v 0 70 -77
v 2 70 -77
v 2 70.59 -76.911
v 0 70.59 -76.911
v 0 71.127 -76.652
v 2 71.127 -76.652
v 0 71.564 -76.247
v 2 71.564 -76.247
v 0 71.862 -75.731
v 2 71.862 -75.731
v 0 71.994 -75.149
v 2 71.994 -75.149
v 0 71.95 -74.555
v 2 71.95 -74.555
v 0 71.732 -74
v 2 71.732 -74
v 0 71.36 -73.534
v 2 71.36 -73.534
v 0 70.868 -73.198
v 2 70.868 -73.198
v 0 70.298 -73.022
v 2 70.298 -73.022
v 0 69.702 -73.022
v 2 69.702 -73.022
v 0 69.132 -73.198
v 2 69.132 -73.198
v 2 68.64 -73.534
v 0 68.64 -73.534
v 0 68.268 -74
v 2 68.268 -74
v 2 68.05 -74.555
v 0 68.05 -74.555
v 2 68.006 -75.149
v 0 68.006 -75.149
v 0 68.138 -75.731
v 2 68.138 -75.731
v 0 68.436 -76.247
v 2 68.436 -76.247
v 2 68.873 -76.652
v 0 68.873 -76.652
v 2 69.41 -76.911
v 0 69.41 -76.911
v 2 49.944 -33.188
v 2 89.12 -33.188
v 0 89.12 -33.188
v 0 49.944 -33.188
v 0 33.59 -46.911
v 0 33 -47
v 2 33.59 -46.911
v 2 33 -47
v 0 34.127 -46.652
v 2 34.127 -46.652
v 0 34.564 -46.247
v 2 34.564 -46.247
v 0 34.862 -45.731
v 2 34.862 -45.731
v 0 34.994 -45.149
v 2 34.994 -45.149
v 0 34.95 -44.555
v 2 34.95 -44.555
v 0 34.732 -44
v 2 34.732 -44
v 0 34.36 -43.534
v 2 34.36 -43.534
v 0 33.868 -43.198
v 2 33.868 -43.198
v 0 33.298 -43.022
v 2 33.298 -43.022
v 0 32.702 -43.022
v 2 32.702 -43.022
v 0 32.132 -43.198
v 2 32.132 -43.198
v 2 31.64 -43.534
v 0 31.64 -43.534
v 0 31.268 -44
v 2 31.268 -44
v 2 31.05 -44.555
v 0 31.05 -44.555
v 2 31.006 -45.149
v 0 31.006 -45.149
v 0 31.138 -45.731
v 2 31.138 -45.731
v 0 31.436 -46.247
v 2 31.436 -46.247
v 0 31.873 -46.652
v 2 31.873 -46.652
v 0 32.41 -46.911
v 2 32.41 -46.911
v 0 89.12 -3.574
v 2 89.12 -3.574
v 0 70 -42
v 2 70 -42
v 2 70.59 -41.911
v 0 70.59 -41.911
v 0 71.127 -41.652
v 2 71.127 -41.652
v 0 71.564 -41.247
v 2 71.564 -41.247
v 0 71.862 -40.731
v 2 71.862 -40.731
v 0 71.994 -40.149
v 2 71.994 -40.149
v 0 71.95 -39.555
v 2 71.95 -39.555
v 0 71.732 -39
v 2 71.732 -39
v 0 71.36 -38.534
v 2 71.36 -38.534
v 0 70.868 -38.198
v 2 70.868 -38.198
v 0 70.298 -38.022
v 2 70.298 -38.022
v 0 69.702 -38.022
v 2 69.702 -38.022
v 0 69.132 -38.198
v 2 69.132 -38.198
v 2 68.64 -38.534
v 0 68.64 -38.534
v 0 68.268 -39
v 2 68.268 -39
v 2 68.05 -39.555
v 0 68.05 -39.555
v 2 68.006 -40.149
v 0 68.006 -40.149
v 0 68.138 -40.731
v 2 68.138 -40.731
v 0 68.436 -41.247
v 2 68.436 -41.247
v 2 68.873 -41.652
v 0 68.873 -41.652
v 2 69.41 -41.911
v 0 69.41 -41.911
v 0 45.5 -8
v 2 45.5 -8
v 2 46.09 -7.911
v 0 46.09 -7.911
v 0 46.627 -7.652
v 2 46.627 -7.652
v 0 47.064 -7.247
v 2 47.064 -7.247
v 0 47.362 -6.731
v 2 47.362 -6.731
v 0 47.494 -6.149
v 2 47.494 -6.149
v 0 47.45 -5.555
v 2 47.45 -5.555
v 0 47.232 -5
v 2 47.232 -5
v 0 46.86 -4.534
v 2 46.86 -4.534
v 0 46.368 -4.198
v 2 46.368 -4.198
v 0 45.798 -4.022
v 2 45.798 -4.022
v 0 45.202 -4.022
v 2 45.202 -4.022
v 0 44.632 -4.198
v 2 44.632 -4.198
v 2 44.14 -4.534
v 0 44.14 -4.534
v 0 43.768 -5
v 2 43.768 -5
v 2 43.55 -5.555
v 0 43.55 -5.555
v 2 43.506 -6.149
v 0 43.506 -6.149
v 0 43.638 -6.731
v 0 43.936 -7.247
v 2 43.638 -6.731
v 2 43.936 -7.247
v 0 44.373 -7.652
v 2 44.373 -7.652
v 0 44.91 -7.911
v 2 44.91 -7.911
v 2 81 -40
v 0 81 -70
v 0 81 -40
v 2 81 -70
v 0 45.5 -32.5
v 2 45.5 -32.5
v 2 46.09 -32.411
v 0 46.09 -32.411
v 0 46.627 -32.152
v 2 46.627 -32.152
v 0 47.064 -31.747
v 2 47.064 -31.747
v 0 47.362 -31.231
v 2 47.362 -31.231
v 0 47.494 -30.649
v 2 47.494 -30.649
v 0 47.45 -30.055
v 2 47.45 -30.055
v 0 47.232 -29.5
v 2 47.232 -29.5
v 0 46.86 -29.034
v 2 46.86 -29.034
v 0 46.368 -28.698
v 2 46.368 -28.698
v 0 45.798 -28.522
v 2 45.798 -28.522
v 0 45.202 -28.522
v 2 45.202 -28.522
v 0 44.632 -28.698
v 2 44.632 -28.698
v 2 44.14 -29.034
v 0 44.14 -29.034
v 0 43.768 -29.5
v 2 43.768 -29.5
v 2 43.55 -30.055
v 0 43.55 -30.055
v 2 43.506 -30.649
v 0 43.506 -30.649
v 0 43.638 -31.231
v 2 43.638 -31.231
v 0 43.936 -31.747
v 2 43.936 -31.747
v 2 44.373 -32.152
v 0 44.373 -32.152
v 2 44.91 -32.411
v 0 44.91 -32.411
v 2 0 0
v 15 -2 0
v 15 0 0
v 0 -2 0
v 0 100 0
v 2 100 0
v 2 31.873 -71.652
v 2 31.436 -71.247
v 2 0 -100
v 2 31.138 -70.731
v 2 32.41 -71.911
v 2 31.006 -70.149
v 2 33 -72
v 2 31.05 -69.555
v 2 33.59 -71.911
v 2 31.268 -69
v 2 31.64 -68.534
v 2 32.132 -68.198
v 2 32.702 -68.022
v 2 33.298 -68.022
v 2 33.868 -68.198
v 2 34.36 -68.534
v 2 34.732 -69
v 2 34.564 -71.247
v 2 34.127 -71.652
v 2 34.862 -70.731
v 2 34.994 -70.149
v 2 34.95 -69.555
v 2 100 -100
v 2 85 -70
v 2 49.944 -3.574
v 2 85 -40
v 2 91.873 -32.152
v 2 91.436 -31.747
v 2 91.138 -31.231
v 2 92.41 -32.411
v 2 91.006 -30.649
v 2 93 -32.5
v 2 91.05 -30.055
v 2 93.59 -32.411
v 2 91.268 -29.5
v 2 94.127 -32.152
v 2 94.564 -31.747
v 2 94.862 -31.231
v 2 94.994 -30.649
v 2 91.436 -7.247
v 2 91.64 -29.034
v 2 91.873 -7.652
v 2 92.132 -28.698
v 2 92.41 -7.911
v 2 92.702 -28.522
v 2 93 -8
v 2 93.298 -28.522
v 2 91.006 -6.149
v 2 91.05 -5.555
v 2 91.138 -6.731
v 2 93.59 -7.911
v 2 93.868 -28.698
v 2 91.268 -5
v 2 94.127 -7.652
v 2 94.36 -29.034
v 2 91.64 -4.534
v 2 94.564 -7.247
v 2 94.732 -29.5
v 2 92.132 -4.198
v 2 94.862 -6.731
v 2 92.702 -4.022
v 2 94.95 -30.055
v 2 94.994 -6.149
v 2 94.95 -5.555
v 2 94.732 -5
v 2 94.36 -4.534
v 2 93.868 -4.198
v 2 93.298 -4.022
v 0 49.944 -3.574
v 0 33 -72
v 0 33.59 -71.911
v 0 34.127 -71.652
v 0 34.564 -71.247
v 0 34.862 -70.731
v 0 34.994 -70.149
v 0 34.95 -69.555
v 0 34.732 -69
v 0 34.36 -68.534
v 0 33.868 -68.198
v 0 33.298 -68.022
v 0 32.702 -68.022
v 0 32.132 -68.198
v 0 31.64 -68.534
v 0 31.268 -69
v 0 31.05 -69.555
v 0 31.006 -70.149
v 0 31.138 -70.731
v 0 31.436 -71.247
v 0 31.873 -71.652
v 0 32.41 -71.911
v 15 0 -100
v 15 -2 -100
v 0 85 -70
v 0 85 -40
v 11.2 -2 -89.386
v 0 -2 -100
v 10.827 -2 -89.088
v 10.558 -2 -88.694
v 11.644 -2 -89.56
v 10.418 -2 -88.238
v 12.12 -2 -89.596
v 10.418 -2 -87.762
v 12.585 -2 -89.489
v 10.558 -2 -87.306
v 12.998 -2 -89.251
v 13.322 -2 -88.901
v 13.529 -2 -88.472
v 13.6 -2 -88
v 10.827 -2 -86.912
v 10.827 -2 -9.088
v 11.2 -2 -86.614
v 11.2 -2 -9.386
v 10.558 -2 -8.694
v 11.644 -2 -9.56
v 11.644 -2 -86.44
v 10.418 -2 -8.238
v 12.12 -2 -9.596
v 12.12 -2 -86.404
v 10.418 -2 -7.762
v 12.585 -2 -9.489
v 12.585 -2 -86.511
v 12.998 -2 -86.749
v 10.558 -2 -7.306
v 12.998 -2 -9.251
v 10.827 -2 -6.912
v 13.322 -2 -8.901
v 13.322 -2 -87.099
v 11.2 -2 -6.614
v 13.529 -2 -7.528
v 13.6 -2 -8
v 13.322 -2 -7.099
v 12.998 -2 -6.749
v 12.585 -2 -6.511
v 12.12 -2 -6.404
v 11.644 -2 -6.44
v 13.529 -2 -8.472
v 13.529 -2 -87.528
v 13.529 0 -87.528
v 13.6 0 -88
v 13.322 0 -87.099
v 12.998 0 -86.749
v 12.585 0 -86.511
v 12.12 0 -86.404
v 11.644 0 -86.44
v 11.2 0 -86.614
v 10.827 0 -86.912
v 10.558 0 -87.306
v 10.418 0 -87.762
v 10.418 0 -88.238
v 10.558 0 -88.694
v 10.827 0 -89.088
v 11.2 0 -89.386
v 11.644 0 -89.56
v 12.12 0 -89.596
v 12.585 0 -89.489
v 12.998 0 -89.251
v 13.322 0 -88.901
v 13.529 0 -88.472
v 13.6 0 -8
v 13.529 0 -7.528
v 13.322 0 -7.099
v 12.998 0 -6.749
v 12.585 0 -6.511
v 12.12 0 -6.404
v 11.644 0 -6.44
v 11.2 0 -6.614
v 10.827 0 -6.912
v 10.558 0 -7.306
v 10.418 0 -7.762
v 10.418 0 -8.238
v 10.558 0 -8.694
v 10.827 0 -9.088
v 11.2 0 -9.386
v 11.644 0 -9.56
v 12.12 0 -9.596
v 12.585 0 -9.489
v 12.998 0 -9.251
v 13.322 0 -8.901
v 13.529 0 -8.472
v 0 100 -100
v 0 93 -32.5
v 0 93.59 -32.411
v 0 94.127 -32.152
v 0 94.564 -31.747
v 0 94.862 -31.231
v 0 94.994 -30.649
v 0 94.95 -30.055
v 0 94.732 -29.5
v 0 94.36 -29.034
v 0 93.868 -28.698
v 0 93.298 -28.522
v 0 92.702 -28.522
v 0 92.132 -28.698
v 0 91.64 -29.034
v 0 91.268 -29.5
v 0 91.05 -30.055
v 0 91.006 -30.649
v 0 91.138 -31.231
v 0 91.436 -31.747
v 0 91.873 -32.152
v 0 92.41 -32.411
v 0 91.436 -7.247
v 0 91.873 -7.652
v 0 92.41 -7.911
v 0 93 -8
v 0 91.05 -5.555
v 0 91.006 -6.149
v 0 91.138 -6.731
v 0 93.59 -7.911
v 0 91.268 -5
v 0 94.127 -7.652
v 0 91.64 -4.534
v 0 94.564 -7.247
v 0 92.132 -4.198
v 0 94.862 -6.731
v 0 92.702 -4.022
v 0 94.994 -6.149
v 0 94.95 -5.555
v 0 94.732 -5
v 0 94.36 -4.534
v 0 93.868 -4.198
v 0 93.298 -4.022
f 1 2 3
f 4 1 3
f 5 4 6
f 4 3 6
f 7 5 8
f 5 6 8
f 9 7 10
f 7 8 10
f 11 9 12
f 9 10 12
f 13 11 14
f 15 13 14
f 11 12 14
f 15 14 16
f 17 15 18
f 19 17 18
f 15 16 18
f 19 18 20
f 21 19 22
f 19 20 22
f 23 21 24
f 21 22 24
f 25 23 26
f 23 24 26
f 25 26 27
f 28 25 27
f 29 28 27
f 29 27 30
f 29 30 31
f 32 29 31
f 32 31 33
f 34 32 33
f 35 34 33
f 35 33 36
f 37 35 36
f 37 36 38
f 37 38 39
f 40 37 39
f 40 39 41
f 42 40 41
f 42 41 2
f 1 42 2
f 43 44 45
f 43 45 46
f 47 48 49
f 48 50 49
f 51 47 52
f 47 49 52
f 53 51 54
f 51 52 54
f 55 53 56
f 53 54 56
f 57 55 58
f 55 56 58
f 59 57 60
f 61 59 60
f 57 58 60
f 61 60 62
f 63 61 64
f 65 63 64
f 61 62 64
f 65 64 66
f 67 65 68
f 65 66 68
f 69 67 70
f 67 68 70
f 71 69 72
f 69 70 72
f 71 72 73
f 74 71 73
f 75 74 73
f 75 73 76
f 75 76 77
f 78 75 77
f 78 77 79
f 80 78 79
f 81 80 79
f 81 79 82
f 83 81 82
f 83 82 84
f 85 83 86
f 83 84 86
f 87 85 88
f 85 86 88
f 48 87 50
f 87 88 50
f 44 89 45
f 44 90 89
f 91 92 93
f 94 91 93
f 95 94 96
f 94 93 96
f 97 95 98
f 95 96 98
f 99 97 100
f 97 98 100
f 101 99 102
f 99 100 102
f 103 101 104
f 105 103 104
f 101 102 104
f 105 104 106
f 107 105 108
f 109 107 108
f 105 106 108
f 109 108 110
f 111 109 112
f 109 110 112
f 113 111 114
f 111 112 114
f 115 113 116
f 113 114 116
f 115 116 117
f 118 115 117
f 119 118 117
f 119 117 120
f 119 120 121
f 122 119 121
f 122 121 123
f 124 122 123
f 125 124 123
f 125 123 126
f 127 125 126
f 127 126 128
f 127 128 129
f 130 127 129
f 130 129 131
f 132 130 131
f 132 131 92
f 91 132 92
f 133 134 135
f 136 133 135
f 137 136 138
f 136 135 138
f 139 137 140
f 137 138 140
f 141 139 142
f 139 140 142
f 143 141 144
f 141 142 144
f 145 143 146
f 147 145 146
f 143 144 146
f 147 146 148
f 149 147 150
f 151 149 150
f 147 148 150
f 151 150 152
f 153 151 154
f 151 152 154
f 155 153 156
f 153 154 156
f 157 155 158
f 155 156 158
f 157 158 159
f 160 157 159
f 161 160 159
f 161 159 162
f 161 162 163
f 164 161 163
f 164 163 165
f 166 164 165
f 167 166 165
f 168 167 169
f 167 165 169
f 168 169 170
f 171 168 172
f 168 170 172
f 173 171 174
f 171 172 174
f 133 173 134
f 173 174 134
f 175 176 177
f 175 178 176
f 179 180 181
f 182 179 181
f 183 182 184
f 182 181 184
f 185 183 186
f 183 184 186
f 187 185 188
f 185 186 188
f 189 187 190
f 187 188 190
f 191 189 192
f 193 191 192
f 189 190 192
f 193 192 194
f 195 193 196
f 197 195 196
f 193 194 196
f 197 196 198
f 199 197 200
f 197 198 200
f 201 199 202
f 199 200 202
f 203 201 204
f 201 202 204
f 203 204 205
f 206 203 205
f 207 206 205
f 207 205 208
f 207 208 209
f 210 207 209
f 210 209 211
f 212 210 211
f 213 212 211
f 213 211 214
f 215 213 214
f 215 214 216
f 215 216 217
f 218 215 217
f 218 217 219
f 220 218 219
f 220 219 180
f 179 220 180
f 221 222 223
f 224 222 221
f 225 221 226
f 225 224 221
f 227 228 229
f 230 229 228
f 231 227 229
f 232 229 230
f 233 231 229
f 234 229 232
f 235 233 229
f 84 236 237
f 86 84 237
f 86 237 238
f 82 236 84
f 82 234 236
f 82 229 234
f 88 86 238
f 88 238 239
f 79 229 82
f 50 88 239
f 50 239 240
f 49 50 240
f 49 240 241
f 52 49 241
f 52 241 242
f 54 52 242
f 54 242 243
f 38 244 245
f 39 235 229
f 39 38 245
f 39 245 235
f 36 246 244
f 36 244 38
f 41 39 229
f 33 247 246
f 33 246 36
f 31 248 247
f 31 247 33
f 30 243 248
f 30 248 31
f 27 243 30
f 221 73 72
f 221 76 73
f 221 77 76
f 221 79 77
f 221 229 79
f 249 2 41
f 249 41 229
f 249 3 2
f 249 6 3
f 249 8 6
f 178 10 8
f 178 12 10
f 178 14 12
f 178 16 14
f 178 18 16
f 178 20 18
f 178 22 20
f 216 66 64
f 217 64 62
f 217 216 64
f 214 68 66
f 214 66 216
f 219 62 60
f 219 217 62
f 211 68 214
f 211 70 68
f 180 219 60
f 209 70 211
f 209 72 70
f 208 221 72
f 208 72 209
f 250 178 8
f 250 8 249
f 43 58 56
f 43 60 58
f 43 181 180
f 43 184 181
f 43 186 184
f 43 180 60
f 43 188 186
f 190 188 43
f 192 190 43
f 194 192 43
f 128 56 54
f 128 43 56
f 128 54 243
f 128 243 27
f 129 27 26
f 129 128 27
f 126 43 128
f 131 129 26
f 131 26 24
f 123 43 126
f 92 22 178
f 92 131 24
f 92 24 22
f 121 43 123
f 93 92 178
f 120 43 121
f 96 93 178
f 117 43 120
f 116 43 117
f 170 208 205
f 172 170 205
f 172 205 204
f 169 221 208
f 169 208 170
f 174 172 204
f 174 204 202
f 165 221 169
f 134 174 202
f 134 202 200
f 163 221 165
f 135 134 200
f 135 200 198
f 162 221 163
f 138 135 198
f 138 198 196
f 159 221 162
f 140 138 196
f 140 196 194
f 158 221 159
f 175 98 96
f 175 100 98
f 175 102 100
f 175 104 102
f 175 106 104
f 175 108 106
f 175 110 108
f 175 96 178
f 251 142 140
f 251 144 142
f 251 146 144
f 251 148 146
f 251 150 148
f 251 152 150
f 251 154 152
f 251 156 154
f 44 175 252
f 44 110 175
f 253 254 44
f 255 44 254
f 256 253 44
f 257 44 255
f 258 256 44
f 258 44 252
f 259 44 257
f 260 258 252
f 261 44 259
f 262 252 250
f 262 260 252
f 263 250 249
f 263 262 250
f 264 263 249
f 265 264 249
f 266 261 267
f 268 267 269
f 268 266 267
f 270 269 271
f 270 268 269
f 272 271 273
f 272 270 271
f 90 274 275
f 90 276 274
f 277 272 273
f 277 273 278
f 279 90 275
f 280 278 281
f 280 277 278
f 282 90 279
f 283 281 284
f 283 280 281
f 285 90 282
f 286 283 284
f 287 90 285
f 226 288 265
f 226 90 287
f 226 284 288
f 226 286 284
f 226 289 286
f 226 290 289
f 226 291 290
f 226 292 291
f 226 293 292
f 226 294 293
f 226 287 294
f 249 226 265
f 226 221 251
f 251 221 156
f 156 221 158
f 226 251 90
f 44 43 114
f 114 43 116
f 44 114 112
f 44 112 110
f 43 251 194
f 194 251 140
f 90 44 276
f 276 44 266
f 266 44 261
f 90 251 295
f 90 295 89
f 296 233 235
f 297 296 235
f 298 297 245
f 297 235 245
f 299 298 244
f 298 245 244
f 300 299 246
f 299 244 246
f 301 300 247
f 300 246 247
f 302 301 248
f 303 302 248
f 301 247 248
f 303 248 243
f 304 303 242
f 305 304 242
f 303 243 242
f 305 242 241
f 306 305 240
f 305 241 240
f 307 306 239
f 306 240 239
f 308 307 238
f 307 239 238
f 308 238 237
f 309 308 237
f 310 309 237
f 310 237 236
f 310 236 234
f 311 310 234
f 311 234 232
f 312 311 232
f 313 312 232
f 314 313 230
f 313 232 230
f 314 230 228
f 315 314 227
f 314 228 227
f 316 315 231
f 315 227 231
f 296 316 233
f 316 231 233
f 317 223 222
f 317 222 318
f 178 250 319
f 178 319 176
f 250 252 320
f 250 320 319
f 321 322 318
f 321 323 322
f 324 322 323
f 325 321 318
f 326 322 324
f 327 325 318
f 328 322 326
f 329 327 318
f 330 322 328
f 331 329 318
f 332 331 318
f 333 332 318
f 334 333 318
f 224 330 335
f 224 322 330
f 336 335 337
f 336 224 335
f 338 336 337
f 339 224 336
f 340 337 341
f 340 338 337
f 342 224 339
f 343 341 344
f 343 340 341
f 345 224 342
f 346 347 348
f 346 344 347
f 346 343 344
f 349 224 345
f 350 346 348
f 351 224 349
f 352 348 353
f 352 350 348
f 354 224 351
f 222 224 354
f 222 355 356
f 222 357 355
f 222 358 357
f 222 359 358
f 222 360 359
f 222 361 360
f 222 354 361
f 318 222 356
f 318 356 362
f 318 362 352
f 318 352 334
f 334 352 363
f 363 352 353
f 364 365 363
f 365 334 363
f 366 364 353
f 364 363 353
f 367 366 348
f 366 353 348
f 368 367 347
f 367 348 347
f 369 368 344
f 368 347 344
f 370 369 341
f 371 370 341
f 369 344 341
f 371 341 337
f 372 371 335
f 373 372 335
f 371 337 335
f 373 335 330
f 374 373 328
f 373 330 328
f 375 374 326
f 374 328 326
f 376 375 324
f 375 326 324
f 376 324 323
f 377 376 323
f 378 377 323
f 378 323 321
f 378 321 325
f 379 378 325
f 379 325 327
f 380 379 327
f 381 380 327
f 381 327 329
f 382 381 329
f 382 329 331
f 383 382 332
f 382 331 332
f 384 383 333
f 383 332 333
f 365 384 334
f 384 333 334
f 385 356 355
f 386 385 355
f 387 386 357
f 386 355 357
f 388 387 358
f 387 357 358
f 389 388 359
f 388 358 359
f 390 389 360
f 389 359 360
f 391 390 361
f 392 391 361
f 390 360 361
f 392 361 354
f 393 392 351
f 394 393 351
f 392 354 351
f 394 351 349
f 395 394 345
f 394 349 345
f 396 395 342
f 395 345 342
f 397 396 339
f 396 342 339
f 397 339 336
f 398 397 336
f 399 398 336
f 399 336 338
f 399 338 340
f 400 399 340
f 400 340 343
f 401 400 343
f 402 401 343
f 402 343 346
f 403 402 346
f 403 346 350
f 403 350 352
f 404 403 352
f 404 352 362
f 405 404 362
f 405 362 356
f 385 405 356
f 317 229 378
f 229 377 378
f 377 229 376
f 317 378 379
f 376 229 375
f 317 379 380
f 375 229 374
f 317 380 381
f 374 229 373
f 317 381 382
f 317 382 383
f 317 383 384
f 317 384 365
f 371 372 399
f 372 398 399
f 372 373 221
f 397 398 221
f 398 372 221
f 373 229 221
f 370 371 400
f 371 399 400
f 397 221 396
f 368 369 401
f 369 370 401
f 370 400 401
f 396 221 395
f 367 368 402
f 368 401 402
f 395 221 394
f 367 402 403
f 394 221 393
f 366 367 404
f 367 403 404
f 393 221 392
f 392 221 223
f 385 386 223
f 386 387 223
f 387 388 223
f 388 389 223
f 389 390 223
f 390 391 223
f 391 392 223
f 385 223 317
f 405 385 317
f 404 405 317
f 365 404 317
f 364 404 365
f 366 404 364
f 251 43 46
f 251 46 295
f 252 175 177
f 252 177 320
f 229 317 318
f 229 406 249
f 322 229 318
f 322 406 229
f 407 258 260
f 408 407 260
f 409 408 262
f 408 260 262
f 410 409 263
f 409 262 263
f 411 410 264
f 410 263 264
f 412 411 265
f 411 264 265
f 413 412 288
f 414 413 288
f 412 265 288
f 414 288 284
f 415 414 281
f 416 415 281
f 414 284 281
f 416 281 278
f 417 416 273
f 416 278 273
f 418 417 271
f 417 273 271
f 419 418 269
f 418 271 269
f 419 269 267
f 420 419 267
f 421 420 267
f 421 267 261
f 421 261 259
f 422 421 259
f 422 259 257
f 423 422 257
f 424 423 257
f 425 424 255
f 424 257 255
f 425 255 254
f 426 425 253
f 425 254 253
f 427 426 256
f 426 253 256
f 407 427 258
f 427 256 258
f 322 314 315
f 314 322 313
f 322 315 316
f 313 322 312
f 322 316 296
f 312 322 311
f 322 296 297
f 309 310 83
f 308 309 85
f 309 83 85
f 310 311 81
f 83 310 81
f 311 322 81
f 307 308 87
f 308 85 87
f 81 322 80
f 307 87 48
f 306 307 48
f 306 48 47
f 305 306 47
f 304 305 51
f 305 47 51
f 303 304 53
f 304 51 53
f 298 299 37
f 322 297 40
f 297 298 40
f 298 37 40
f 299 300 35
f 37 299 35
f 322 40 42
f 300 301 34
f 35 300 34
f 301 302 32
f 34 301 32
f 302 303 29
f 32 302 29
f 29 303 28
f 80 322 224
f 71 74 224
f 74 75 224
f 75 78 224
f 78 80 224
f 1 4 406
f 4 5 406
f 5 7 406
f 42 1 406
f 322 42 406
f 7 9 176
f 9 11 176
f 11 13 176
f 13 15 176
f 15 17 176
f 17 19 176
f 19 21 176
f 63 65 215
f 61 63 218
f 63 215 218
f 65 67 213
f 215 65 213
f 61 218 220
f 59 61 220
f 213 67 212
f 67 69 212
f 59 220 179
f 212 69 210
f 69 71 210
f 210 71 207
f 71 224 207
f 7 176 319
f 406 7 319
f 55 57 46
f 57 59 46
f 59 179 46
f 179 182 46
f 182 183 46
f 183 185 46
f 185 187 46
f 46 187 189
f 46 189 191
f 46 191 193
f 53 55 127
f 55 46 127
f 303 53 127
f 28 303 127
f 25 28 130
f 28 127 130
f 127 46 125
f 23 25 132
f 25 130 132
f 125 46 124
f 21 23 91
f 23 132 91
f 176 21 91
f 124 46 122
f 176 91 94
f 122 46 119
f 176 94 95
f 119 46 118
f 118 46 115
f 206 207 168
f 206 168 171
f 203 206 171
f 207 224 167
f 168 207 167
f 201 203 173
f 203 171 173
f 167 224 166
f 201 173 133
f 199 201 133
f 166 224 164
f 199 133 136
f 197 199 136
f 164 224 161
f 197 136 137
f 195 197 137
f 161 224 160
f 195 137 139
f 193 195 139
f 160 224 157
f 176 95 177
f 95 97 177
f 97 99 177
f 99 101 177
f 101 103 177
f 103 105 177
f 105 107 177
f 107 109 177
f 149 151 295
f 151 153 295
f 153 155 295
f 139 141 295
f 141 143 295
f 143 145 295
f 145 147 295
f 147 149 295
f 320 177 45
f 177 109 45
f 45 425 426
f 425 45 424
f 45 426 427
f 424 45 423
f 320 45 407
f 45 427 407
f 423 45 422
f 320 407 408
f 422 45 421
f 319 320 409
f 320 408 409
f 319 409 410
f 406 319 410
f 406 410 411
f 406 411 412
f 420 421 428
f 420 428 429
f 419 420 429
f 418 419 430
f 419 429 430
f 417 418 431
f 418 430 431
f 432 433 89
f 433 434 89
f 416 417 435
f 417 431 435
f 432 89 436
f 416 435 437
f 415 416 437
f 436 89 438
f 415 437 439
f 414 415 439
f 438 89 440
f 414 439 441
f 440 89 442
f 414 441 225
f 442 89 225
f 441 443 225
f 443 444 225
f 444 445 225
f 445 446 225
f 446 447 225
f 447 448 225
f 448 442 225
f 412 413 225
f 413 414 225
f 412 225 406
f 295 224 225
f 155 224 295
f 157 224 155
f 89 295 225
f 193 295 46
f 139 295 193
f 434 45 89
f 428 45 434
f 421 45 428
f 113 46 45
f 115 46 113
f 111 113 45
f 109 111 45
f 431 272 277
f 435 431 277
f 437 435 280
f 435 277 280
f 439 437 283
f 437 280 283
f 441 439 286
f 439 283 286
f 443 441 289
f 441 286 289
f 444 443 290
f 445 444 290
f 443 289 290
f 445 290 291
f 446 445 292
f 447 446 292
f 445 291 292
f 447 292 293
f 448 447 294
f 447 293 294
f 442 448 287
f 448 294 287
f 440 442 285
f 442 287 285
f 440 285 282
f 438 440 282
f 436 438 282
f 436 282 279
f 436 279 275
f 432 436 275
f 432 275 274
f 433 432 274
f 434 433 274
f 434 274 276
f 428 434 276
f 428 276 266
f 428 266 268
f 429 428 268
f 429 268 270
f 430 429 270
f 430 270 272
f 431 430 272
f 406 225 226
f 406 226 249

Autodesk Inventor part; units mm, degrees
ref_plane "YZ Plane" through (0, 0, 0) normal (1, 0, 0) x (0, 1, 0)
ref_plane "XZ Plane" through (0, 0, 0) normal (0, 1, 0) x (-1, 0, 0)
ref_plane "XY Plane" through (0, 0, 0) normal (0, 0, 1) x (1, 0, 0)
sketch "草图1" plane through (0, 0, 0) normal (1, 0, 0) x (0, 1, 0)
  line L0 (0, 0) -> (100, 0)
  line L1 (100, 0) -> (100, -100)
  line L2 (100, -100) -> (0, -100)
  line L3 (0, -100) -> (0, 0)
  dimension "d0" = 100
  dimension "d1" = 100
extrude "拉伸1" add sketch "草图1" along normal blind 2
sketch "草图2" plane through (0, 0, -100) normal (0, -1, 0) x (1, 0, 0)
  line L0 (0, 0) -> (0, 100) projected
  line L1 (0, 100) -> (15, 100)
  line L2 (15, 100) -> (15, 0)
  line L3 (15, 0) -> (0, 0)
  line L4 (0, 0) -> (0, 100)
  dimension "d30" = 15
extrude "拉伸2" add sketch "草图2" along normal blind 2
sketch "草图3" plane through (0, -2, -100) normal (0, -1, 0) x (1, 0, 0)
  circle A0 centre (12, 92) radius 1.6
  line L0 (0, 100) -> (0, 0) projected
  circle A1 centre (12, 12) radius 1.6
  line L1 (0, 0) -> (15, 0) projected
  dimension "d6" = 12
  dimension "d7" = 12
  dimension "d8" = 80
  dimension "d9" = 12
  dimension "d12" = 3.2
  dimension "d13" = 3.2
extrude "拉伸3" cut sketch "草图3" against normal blind 2
sketch "草图4" plane through (2, 0, 0) normal (1, 0, 0) x (0, 0, -1)
  line L0 (40, 85) -> (70, 85)
  line L1 (70, 85) -> (70, 81)
  line L2 (70, 81) -> (40, 81)
  line L3 (40, 81) -> (40, 85)
  line L4 (100, 100) -> (0, 100) projected
  line L5 (0, 100) -> (0, 0) projected
  circle A0 centre (40, 70) radius 2
  circle A1 centre (75, 70) radius 2
  circle A2 centre (70, 33) radius 2
  circle A3 centre (45, 33) radius 2
  point P0 (40, 83)
  point P1 (70, 83)
  dimension "d14" = 30
  dimension "d15" = 15
  dimension "d16" = 40
  dimension "d17" = 4
  dimension "d18" = 13
  dimension "d19" = 13
  dimension "d20" = 35
  dimension "d21" = 5
  dimension "d22" = 37
  dimension "d23" = 25
  dimension "d24" = 4
  dimension "d25" = 4
  dimension "d26" = 4
  dimension "d27" = 4
extrude "拉伸4" cut sketch "草图4" against normal blind 2
sketch "草图5" plane through (2, 0, 0) normal (1, 0, 0) x (0, 0, -1)
  circle A0 centre (6, 93) radius 2
  circle A1 centre (30.5, 93) radius 2
  circle A2 centre (6, 45.5) radius 2
  line L0 (100, 100) -> (0, 100) projected
  line L1 (0, 100) -> (0, 0) projected
  circle A3 centre (30.5, 45.5) radius 2
  dimension "d31" = 4
  dimension "d32" = 4
  dimension "d33" = 24.5
  dimension "d34" = 47.5
  dimension "d35" = 7
  dimension "d36" = 7
  dimension "d37" = 6
  dimension "d38" = 6
  dimension "d39" = 4
  dimension "d40" = 4
sketch "草图6" plane through (2, 0, 0) normal (1, 0, 0) x (0, 0, -1)
  line L0 (3.5741, 89.1195) -> (33.1877, 89.1195)
  line L1 (33.1877, 89.1195) -> (33.1877, 49.9441)
  line L2 (33.1877, 49.9441) -> (3.5741, 49.9441)
  line L3 (3.5741, 49.9441) -> (3.5741, 89.1195)
  point P0 (0, 0)
extrude "拉伸5" cut sketch "草图6" against normal blind 2
extrude "拉伸6" cut sketch "草图5" against normal blind 2
properties part number "板"
